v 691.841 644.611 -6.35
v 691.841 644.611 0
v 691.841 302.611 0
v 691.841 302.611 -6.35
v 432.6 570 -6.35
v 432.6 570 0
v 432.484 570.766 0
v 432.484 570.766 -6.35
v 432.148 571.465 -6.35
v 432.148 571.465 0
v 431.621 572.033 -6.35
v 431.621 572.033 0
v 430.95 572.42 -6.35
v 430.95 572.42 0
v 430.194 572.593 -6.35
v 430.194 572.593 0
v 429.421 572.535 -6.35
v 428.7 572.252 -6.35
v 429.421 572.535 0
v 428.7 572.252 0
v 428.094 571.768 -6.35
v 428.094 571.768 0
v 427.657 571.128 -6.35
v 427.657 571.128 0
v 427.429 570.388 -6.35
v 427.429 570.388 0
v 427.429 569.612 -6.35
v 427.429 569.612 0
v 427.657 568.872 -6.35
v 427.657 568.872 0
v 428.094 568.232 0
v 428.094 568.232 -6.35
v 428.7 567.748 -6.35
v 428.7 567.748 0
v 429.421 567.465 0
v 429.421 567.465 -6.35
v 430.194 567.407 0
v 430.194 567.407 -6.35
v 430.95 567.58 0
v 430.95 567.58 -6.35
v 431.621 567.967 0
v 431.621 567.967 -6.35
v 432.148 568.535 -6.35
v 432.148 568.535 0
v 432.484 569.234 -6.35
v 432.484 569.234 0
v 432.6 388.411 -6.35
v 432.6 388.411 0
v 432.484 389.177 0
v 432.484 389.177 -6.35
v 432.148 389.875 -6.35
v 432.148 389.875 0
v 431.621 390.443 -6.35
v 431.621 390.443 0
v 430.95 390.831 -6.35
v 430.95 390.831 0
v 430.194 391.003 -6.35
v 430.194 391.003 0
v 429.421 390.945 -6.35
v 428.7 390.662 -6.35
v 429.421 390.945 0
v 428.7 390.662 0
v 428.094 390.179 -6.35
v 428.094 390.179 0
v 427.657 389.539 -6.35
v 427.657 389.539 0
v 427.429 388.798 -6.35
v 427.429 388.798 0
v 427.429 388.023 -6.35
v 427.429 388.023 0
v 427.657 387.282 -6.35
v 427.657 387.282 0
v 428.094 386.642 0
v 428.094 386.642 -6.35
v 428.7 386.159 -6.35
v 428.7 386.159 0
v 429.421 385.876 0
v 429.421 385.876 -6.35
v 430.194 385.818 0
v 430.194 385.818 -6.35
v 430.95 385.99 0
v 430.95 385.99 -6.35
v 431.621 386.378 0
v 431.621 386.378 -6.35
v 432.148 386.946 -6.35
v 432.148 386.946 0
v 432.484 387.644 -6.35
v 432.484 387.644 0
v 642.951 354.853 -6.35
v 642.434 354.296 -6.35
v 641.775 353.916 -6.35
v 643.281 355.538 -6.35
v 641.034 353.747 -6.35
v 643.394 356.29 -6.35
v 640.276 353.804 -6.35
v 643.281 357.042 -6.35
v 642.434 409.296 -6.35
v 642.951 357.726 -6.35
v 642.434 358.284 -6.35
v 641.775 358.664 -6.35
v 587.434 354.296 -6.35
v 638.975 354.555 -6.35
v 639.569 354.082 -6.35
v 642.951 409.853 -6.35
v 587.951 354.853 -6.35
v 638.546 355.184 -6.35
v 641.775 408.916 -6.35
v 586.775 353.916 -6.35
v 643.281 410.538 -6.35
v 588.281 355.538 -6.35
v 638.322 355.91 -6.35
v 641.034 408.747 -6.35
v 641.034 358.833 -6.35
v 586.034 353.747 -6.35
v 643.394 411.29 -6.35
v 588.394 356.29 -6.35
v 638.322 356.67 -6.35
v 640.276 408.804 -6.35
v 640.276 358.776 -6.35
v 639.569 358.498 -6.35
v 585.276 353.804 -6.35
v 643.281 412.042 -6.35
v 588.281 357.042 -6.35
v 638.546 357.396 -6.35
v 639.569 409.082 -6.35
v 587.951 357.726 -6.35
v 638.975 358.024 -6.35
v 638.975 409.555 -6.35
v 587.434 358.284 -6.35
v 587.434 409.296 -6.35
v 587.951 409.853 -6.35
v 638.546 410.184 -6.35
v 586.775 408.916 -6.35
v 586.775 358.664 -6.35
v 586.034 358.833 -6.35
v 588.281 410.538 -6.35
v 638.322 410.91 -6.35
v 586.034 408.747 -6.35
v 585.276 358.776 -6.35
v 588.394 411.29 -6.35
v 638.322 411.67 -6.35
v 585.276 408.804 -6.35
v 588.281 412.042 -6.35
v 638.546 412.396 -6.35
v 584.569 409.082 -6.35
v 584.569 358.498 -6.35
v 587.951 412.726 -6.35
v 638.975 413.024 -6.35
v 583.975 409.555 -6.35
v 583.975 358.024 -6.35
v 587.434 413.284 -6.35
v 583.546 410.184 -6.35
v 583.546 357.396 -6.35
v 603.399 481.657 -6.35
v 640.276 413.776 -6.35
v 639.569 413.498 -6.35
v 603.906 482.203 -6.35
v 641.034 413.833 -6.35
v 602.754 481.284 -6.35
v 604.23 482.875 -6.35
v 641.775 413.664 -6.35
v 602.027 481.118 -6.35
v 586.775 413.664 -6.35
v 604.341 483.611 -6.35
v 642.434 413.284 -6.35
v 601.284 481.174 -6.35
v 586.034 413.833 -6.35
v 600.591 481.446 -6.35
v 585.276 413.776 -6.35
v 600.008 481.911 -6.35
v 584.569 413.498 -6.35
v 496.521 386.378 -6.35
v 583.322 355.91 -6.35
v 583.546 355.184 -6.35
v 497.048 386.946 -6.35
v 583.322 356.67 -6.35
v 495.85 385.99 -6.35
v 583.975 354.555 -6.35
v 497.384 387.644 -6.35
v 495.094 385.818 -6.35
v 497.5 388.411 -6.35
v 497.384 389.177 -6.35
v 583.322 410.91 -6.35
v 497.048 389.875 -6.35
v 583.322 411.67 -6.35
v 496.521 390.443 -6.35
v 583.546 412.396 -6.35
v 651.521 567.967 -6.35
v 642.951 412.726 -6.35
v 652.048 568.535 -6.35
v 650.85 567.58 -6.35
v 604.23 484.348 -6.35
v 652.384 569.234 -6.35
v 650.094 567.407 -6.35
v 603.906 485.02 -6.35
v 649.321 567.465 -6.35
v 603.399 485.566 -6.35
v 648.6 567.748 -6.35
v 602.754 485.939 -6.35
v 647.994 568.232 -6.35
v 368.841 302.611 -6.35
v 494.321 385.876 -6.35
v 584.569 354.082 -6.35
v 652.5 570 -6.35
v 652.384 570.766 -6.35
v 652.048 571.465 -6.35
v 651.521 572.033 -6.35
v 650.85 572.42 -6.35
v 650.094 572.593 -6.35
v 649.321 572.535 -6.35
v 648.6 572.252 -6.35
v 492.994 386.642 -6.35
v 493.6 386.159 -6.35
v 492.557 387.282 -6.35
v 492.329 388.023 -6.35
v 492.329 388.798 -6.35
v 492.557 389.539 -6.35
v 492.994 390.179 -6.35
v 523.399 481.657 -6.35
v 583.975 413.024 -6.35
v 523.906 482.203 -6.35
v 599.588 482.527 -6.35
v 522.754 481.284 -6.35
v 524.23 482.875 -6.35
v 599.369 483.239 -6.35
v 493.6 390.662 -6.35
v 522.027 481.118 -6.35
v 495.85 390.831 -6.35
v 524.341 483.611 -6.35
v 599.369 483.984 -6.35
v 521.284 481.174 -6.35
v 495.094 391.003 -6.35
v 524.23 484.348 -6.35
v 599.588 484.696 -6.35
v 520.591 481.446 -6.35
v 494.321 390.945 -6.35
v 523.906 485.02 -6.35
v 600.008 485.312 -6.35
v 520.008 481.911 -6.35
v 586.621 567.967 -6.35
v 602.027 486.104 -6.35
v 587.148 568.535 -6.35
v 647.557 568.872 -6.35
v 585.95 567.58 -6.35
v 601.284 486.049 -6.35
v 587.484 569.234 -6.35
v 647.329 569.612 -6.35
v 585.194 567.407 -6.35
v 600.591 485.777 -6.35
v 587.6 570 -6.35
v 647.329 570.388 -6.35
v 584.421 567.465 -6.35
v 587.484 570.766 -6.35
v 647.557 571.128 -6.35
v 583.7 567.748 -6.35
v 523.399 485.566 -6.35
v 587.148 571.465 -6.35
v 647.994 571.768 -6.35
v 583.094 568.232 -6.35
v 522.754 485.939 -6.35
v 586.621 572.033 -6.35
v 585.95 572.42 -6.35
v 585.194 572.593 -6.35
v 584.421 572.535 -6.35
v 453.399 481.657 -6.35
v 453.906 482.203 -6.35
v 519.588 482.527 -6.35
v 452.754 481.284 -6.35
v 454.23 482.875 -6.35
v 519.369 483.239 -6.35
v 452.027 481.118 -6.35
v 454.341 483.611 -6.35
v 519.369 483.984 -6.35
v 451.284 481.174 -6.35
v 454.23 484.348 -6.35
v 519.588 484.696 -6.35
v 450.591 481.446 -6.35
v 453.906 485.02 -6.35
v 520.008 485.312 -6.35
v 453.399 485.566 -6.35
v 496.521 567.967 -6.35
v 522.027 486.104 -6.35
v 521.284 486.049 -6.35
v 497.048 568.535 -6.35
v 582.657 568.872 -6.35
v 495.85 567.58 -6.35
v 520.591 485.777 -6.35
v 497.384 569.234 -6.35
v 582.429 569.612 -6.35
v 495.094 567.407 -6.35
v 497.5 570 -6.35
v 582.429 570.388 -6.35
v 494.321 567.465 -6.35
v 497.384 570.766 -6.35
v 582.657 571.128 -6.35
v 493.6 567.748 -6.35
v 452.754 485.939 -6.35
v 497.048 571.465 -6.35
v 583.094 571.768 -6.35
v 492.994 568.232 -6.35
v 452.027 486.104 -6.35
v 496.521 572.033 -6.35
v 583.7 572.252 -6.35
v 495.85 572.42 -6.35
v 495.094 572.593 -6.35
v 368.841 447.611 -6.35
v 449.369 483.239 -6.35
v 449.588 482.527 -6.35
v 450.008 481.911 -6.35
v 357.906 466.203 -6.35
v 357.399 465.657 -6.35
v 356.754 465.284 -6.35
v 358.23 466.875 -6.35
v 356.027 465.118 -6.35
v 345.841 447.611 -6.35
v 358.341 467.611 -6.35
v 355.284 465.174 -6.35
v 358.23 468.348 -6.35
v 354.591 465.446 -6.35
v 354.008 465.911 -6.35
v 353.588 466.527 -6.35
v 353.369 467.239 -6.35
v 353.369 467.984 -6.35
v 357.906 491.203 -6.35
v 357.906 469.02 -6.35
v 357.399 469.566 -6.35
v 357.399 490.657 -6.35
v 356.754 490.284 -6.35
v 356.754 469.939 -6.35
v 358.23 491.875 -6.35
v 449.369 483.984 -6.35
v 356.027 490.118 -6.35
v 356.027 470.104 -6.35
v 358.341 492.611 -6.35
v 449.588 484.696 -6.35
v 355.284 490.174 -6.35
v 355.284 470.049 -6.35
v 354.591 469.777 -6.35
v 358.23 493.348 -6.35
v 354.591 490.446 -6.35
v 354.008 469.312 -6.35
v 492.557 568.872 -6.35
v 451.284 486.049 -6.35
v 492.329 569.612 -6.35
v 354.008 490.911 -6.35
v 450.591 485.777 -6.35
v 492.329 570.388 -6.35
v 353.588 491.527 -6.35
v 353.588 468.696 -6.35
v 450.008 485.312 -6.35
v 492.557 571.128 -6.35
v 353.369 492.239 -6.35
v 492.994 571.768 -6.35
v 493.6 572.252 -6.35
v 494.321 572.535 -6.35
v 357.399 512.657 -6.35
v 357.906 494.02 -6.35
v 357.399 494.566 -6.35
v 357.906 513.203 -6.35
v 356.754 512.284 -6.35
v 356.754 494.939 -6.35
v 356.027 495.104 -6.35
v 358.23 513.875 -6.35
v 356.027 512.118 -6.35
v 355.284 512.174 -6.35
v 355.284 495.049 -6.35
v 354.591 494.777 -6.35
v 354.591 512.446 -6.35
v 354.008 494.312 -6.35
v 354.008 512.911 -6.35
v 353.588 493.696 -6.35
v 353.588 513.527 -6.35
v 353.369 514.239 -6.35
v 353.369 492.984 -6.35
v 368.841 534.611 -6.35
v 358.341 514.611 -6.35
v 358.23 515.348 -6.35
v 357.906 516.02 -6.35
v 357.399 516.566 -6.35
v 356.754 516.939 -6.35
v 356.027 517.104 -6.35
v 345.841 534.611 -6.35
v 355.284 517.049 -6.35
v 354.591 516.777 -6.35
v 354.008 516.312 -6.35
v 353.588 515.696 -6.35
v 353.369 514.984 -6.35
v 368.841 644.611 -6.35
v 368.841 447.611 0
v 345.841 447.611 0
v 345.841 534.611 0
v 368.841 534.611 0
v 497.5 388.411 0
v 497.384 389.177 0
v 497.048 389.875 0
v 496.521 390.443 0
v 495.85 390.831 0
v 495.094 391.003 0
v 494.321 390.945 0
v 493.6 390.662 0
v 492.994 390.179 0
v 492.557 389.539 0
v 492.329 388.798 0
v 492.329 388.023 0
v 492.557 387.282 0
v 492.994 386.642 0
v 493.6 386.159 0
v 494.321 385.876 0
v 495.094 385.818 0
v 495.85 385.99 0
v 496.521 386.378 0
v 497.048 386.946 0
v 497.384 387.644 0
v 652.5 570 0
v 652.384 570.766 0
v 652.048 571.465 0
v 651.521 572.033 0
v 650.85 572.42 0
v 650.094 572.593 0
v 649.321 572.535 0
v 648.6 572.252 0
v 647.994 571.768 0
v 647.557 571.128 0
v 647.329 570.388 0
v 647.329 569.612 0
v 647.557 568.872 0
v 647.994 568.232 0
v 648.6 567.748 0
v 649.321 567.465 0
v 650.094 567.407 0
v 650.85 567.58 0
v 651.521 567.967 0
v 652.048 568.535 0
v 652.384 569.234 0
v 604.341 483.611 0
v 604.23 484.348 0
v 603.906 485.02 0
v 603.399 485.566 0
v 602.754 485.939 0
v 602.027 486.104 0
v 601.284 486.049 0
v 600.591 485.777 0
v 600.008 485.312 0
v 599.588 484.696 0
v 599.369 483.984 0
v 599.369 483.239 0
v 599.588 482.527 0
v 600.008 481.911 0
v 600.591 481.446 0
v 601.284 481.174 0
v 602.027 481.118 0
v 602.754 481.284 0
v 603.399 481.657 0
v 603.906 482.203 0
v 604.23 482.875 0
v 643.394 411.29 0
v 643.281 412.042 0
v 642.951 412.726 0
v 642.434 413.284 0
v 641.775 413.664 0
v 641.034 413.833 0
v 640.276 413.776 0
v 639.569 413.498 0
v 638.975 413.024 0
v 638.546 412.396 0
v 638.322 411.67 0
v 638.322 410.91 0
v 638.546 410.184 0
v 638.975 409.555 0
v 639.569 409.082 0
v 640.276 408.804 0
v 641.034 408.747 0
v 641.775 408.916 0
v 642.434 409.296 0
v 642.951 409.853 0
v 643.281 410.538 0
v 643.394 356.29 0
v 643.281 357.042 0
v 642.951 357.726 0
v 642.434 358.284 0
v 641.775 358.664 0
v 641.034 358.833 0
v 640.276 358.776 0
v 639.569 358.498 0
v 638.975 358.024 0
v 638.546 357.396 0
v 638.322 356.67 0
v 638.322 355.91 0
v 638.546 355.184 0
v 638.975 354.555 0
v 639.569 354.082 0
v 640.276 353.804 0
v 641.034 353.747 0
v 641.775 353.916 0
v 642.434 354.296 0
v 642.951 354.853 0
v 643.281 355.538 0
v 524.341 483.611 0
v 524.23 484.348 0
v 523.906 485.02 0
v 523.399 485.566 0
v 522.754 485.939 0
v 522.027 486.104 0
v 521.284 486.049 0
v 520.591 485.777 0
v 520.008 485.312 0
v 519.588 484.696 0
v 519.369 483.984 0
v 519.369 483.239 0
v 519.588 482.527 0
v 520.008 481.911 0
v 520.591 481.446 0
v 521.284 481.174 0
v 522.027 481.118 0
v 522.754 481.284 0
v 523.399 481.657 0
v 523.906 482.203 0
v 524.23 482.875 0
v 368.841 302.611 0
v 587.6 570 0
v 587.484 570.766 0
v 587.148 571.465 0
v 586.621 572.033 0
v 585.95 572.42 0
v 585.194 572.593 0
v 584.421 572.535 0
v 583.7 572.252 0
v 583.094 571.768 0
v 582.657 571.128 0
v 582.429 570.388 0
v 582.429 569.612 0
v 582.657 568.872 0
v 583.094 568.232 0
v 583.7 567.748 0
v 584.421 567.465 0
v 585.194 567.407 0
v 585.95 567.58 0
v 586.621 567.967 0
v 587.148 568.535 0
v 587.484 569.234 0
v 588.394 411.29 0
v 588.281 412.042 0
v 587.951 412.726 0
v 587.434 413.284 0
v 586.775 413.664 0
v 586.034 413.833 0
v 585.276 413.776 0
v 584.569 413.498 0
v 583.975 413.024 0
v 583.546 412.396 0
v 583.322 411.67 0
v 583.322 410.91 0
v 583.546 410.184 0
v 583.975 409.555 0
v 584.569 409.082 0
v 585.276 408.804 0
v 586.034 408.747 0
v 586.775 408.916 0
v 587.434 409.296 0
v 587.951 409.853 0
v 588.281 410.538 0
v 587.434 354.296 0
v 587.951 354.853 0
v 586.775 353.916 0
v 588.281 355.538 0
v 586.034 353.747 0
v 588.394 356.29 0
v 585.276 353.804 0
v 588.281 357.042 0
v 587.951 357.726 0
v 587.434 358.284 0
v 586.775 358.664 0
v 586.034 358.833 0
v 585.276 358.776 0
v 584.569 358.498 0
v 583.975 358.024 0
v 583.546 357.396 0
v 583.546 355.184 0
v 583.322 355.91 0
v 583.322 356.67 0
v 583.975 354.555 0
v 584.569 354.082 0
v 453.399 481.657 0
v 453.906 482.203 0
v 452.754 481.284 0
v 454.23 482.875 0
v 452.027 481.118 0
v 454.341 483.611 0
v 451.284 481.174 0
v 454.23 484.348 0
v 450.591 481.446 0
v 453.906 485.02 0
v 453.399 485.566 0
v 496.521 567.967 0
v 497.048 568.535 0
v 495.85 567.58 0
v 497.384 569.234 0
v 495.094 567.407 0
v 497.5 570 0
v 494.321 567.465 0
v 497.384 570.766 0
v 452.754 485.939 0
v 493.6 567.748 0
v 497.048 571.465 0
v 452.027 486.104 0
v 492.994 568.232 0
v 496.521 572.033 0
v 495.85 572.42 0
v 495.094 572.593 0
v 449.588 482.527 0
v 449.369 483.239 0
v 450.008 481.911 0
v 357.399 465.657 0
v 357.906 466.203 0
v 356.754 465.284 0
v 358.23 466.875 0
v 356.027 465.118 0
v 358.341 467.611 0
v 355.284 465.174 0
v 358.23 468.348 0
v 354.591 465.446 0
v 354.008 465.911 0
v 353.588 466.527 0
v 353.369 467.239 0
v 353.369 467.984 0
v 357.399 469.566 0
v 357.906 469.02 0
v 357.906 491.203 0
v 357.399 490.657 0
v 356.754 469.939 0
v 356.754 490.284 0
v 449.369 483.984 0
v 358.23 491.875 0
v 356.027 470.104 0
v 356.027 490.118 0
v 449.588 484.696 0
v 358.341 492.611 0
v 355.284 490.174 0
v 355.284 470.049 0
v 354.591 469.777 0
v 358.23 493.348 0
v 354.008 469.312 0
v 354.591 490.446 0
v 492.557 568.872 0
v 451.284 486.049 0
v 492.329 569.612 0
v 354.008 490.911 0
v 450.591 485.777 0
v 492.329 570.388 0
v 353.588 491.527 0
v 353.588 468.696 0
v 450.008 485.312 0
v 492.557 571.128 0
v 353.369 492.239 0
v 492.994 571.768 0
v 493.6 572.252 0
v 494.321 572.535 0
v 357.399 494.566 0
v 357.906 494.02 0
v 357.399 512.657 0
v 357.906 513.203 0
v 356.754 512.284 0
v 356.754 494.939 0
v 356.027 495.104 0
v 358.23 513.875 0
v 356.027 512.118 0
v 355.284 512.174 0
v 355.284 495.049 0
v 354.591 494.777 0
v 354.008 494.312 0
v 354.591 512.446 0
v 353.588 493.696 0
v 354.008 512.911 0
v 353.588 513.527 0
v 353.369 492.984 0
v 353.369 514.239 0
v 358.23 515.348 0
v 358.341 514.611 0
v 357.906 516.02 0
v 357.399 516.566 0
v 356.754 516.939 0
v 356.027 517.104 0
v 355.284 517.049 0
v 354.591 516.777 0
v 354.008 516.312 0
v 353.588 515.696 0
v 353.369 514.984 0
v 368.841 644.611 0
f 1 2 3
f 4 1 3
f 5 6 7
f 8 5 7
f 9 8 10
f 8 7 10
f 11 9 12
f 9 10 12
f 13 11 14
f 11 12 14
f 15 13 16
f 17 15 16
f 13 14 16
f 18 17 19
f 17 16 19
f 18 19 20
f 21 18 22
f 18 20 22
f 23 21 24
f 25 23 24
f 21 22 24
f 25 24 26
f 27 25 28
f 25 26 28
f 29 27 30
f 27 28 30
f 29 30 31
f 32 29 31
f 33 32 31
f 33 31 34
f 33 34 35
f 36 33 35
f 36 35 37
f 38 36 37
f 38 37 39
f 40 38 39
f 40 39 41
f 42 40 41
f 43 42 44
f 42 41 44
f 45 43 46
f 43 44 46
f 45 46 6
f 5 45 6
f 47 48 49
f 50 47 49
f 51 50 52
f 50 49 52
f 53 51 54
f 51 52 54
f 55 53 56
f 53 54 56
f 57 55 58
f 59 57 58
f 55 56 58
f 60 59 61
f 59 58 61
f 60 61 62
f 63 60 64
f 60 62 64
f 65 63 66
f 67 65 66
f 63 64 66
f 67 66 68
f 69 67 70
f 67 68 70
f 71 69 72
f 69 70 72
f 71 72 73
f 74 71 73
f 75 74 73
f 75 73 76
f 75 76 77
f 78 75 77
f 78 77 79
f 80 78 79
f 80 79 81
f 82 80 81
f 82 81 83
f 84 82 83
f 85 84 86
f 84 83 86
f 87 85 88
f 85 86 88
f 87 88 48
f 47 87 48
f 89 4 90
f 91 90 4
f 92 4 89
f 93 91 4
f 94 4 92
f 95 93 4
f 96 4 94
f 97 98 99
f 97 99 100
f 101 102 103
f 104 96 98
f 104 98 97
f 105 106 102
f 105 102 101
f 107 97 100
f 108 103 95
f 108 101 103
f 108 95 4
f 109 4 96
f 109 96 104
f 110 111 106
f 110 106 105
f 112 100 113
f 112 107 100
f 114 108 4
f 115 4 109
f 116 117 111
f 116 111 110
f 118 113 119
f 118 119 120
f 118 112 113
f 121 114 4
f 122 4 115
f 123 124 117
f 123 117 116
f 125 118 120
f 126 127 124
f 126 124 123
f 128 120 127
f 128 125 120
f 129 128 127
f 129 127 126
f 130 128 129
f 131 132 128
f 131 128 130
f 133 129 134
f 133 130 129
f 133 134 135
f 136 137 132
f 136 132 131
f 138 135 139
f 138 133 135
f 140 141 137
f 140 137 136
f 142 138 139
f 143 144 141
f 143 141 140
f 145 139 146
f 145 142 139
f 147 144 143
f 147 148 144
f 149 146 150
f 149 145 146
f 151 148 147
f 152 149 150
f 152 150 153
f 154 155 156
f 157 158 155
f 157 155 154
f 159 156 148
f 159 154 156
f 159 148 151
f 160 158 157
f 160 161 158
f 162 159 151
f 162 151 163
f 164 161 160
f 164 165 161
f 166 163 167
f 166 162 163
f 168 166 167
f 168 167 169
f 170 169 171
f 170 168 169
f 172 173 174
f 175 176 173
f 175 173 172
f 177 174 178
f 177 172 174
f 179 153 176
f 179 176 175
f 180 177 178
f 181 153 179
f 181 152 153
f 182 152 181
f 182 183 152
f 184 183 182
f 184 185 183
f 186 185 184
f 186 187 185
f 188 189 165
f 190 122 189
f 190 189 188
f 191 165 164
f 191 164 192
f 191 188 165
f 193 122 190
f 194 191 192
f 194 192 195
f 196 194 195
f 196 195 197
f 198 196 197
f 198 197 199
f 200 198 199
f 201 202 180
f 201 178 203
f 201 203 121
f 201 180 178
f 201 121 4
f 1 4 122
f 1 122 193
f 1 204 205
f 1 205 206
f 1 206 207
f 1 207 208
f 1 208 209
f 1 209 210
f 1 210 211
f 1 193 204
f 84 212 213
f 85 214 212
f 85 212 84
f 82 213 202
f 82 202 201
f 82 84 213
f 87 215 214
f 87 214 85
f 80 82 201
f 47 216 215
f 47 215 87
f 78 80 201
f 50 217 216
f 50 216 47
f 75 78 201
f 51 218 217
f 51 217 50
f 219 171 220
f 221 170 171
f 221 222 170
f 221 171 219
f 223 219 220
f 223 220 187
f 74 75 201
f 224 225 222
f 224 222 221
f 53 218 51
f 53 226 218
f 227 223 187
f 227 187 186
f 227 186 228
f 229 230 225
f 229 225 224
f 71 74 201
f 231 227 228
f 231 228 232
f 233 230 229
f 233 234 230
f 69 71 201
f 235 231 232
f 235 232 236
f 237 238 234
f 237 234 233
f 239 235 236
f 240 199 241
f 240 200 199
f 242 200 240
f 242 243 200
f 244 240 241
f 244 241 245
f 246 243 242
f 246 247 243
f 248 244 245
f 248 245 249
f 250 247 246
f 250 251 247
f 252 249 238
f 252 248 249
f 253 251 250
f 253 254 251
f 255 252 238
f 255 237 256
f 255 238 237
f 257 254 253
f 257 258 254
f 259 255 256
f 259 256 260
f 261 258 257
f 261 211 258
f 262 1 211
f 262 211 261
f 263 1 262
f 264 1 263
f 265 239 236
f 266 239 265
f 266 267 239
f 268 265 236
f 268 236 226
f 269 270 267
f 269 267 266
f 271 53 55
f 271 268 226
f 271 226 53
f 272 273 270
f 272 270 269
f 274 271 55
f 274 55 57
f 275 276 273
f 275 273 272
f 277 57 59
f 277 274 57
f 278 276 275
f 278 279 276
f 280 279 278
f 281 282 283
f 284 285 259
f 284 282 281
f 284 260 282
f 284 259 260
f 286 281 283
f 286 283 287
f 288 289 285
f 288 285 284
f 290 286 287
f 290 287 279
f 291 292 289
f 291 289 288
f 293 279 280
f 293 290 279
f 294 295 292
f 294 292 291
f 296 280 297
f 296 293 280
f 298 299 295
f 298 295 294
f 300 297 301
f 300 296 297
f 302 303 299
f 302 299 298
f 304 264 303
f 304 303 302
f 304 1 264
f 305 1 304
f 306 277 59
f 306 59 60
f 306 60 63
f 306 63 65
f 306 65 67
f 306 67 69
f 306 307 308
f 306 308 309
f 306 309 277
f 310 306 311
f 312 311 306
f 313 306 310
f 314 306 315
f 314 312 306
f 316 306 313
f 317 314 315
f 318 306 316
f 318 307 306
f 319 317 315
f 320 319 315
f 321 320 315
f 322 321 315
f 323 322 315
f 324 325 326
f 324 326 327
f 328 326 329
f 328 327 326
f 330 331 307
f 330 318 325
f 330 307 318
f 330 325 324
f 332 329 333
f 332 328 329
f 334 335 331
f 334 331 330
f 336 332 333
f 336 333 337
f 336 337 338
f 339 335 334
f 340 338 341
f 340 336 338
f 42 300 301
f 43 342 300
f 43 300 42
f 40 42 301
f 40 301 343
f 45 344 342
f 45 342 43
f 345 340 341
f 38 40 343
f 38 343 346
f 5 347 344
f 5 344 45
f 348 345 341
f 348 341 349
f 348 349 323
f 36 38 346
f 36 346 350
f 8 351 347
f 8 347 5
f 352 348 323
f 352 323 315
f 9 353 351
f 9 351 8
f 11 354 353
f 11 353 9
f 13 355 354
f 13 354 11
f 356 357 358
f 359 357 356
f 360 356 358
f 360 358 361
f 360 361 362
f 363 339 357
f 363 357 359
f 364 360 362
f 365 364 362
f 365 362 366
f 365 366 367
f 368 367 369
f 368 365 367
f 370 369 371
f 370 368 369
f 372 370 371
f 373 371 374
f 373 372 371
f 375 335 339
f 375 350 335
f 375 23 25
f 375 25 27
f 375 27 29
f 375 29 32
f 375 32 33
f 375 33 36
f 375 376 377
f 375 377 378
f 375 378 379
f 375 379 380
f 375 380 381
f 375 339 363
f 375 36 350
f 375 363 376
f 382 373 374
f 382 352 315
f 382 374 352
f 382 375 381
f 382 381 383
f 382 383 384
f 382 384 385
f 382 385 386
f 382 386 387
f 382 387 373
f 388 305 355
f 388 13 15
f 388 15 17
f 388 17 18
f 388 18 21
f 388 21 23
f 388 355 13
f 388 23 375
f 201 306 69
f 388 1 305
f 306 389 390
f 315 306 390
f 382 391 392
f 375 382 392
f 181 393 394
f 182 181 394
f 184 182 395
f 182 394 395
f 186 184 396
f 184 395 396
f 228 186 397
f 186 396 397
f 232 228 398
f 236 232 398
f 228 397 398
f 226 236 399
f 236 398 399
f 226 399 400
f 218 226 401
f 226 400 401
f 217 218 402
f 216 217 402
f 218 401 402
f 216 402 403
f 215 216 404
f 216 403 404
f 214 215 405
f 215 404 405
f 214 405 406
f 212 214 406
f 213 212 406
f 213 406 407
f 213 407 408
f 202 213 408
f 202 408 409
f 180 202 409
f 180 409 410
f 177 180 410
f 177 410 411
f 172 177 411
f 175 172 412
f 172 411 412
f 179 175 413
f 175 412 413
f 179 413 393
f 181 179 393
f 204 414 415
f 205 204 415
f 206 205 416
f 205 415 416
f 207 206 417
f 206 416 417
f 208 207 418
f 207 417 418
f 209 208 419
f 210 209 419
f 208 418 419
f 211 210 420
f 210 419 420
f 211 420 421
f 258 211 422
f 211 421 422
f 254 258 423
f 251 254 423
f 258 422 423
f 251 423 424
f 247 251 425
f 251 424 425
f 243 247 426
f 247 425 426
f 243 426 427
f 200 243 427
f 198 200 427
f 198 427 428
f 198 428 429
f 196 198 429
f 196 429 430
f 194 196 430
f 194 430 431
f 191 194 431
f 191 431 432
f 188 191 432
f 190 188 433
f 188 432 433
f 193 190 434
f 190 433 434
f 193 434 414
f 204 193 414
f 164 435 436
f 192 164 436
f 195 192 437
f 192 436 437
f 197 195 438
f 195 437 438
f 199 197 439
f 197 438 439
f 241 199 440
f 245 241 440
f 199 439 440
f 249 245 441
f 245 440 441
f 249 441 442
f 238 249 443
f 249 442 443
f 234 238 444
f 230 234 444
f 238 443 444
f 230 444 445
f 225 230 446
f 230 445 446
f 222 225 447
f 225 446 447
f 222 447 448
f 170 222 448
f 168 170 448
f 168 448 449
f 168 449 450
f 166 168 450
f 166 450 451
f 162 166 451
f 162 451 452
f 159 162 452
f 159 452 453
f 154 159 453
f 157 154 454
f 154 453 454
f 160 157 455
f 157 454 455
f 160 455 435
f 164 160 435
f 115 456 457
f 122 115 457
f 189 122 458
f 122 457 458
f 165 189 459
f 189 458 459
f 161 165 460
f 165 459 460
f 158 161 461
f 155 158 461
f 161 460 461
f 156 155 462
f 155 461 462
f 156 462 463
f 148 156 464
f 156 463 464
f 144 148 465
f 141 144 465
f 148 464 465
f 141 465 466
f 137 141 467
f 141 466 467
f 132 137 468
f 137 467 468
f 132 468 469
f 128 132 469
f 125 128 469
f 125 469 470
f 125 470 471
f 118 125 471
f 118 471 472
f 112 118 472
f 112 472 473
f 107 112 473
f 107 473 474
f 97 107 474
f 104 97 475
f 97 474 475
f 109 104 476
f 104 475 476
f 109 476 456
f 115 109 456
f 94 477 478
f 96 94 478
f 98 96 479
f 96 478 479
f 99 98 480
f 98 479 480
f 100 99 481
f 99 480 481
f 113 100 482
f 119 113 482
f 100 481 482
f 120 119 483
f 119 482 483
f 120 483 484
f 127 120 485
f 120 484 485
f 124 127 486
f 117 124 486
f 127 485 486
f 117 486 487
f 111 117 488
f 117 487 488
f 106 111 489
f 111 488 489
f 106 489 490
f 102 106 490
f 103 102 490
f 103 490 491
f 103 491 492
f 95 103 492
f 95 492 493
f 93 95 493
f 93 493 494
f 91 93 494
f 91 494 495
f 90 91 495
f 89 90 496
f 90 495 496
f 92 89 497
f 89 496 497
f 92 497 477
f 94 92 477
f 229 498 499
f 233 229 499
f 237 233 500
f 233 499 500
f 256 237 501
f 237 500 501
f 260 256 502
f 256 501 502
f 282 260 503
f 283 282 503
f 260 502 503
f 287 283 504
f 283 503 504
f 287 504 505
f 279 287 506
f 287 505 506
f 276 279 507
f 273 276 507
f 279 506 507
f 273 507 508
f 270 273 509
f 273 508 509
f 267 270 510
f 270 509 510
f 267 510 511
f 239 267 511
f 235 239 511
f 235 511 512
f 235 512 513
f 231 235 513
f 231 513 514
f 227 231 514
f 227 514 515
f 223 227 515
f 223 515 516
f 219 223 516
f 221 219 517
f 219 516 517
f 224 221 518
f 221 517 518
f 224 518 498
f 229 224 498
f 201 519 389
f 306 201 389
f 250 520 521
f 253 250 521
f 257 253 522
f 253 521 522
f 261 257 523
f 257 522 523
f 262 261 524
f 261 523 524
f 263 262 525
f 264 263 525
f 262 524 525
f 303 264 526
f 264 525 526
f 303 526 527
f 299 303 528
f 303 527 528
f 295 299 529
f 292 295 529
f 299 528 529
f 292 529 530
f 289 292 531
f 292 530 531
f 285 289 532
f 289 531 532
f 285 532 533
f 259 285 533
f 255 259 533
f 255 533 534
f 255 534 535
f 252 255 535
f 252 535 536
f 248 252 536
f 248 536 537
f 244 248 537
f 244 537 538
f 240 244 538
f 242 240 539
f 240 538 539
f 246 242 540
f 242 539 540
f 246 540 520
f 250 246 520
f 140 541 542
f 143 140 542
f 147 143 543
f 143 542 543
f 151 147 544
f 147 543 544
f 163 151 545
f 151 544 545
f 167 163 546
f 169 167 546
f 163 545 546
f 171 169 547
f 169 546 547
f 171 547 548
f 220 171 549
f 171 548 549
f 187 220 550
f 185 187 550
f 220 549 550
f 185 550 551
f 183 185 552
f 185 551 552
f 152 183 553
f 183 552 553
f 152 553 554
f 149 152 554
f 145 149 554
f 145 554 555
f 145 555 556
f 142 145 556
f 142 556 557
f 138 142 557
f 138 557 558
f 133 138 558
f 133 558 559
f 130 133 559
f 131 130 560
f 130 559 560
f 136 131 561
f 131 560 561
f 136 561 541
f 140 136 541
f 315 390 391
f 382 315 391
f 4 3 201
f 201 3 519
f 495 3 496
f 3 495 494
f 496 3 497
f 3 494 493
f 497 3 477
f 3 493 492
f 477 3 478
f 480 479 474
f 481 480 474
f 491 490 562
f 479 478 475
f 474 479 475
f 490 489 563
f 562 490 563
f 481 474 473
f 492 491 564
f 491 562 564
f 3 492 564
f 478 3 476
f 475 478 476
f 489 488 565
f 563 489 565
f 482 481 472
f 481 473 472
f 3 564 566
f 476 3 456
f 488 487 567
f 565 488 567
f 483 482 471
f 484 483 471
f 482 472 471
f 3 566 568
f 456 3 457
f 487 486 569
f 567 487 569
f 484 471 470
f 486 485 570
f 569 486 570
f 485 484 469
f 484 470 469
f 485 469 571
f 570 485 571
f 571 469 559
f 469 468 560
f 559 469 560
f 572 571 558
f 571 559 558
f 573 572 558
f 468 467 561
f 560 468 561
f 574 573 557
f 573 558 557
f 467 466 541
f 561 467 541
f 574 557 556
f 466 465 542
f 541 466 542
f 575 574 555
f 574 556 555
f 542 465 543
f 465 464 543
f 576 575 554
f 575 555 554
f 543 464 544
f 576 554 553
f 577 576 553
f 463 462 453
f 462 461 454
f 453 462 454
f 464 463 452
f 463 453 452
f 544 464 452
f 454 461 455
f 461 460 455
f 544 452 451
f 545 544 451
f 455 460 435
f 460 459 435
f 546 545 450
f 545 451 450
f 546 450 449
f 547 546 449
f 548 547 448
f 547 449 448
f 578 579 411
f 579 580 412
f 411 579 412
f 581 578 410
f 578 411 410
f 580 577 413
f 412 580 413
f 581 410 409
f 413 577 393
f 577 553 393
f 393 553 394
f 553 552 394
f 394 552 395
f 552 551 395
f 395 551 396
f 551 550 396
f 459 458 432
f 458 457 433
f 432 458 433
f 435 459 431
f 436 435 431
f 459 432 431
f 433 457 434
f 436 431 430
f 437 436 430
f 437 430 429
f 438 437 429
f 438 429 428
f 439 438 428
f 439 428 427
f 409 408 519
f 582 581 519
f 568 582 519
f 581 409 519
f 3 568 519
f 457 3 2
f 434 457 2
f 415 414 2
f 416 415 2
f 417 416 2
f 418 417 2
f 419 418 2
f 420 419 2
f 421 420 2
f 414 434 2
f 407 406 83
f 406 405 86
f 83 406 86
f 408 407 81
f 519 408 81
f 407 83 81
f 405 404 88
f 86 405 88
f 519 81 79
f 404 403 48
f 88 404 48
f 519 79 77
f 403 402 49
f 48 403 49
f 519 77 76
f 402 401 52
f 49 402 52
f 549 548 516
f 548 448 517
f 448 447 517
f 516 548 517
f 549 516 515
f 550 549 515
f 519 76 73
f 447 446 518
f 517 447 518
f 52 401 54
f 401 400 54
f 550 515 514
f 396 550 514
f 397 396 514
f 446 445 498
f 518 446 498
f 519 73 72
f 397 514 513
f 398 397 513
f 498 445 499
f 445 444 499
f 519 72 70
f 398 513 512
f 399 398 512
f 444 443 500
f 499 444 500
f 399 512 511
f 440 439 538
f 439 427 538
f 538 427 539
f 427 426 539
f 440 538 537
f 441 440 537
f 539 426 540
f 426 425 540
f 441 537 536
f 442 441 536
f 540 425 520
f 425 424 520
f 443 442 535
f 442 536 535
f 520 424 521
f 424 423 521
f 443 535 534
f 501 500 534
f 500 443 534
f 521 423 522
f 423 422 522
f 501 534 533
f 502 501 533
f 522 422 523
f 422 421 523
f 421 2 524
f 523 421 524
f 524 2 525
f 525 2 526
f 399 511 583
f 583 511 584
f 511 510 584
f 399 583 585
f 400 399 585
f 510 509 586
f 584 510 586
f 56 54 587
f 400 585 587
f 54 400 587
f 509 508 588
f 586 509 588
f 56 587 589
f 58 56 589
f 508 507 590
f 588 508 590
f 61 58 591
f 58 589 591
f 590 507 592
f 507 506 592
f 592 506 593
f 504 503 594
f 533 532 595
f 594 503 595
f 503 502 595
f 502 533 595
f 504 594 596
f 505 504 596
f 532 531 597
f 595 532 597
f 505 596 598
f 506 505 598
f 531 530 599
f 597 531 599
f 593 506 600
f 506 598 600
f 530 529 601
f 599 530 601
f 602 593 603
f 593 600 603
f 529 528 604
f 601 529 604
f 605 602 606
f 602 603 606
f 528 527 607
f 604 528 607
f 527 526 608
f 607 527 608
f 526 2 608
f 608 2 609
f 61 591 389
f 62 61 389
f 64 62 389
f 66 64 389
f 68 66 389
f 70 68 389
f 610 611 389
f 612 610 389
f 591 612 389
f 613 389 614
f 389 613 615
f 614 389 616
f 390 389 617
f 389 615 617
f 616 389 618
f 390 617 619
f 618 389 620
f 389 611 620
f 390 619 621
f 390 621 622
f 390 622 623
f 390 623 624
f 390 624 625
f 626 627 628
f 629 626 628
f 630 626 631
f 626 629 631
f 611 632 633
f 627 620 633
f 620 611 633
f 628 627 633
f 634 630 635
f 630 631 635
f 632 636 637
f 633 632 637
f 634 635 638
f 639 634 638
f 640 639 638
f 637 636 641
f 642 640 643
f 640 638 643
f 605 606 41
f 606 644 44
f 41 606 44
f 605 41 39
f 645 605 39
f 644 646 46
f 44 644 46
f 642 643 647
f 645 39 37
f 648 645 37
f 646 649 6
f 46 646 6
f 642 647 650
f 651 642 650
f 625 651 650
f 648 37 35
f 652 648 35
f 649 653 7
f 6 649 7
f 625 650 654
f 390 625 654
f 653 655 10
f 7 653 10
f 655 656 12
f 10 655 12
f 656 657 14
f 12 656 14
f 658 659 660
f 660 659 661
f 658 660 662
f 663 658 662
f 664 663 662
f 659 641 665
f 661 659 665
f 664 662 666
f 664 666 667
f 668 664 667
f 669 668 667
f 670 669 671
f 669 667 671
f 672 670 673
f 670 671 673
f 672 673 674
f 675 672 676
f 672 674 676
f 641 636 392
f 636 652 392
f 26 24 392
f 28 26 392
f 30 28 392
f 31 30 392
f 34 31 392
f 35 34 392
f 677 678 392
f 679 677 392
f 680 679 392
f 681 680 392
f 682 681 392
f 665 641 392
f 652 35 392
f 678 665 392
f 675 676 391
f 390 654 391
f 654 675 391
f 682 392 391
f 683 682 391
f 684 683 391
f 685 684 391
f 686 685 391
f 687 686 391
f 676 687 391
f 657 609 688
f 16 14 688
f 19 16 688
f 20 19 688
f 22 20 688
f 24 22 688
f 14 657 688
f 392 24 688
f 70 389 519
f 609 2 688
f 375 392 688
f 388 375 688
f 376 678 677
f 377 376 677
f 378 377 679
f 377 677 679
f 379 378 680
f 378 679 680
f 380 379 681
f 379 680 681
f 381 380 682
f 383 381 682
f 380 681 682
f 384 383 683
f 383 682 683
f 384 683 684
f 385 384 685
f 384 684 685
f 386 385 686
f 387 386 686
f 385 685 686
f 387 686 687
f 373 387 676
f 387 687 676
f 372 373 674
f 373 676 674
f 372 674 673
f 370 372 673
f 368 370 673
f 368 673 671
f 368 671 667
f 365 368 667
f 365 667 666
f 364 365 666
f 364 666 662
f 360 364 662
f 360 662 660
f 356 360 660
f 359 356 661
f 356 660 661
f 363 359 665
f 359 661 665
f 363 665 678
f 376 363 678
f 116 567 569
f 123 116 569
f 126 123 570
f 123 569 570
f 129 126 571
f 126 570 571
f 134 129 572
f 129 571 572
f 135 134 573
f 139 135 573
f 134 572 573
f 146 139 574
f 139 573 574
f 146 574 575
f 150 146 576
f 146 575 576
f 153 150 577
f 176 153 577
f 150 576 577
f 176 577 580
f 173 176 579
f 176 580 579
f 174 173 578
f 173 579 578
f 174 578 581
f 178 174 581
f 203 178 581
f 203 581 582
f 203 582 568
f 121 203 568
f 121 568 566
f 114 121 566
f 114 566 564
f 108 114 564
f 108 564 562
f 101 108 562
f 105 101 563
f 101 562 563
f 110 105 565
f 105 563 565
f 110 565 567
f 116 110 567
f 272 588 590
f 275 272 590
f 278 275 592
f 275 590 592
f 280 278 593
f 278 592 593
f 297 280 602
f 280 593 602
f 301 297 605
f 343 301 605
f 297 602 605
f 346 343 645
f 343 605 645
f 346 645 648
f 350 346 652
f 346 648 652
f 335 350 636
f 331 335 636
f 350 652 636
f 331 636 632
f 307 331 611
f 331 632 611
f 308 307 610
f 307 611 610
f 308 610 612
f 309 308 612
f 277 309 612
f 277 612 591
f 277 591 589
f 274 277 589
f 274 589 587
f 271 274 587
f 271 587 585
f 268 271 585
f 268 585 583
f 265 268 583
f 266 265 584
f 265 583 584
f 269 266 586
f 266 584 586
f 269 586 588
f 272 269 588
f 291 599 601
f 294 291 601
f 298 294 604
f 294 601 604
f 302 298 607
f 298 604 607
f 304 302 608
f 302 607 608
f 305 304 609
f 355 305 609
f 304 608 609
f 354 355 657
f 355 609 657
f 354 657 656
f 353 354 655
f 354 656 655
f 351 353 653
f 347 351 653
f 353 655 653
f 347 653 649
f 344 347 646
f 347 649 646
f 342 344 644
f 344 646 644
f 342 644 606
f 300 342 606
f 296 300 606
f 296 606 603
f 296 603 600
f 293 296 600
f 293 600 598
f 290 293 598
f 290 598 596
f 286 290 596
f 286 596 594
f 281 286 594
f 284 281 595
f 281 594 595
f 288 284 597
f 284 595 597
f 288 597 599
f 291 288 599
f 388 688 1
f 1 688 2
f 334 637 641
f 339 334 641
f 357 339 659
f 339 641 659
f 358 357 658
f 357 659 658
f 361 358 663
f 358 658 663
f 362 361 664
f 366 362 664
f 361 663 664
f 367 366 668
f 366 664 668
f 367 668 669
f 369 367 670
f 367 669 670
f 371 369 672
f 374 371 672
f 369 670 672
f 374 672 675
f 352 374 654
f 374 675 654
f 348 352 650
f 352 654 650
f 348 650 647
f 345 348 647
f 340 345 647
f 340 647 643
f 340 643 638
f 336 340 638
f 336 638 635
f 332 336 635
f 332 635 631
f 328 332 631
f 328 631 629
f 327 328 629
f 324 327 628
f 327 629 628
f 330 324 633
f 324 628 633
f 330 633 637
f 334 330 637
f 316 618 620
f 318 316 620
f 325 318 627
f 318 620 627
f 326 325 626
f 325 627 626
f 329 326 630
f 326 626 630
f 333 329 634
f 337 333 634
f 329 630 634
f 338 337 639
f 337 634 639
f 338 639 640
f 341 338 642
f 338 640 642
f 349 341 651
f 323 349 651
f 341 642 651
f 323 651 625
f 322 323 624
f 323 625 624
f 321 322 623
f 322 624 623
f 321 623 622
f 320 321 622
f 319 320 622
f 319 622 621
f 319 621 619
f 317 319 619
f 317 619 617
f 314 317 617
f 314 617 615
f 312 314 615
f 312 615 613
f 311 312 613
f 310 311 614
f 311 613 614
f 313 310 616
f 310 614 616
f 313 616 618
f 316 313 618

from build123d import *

# Parameters (mm, degrees)
MODEL_R             = 2.5
MODEL_R_2           = 2.6
MODEL_R_3           = 2.55
BOSS_EXTRUDE1_DEPTH = 6.35


with BuildPart() as part:
    # Model → Boss-Extrude1 (new body)
    with BuildSketch(Plane.XY):
        Polygon((691.840616937, 302.611489719), (368.840616937, 302.611489719), (368.840616937, 447.611489719), (345.840616937, 447.611489719), (345.840616937, 534.611489719), (368.840616937, 534.611489719), (368.840616937, 644.611489719), (691.840616937, 644.611489719), align=None)
        with Locations((355.840616937, 514.611489719)):
            Circle(MODEL_R, mode=Mode.SUBTRACT)
        with Locations((355.840616937, 492.611489719)):
            Circle(MODEL_R, mode=Mode.SUBTRACT)
        with Locations((355.840616937, 467.611489719)):
            Circle(MODEL_R, mode=Mode.SUBTRACT)
        with Locations((430, 570)):
            Circle(MODEL_R_2, mode=Mode.SUBTRACT)
        with Locations((494.9, 570)):
            Circle(MODEL_R_2, mode=Mode.SUBTRACT)
        with Locations((451.840616937, 483.611489719)):
            Circle(MODEL_R, mode=Mode.SUBTRACT)
        with Locations((521.840616937, 483.611489719)):
            Circle(MODEL_R, mode=Mode.SUBTRACT)
        with Locations((601.840616937, 483.611489719)):
            Circle(MODEL_R, mode=Mode.SUBTRACT)
        with Locations((585, 570)):
            Circle(MODEL_R_2, mode=Mode.SUBTRACT)
        with Locations((649.9, 570)):
            Circle(MODEL_R_2, mode=Mode.SUBTRACT)
        with Locations((430, 388.410571956)):
            Circle(MODEL_R_2, mode=Mode.SUBTRACT)
        with Locations((494.9, 388.410571956)):
            Circle(MODEL_R_2, mode=Mode.SUBTRACT)
        with Locations((585.843810025, 411.289923372)):
            Circle(MODEL_R_3, mode=Mode.SUBTRACT)
        with Locations((640.843810025, 411.289923372)):
            Circle(MODEL_R_3, mode=Mode.SUBTRACT)
        with Locations((585.843810025, 356.289923372)):
            Circle(MODEL_R_3, mode=Mode.SUBTRACT)
        with Locations((640.843810025, 356.289923372)):
            Circle(MODEL_R_3, mode=Mode.SUBTRACT)
    extrude(amount=-BOSS_EXTRUDE1_DEPTH)


solid = part.part
